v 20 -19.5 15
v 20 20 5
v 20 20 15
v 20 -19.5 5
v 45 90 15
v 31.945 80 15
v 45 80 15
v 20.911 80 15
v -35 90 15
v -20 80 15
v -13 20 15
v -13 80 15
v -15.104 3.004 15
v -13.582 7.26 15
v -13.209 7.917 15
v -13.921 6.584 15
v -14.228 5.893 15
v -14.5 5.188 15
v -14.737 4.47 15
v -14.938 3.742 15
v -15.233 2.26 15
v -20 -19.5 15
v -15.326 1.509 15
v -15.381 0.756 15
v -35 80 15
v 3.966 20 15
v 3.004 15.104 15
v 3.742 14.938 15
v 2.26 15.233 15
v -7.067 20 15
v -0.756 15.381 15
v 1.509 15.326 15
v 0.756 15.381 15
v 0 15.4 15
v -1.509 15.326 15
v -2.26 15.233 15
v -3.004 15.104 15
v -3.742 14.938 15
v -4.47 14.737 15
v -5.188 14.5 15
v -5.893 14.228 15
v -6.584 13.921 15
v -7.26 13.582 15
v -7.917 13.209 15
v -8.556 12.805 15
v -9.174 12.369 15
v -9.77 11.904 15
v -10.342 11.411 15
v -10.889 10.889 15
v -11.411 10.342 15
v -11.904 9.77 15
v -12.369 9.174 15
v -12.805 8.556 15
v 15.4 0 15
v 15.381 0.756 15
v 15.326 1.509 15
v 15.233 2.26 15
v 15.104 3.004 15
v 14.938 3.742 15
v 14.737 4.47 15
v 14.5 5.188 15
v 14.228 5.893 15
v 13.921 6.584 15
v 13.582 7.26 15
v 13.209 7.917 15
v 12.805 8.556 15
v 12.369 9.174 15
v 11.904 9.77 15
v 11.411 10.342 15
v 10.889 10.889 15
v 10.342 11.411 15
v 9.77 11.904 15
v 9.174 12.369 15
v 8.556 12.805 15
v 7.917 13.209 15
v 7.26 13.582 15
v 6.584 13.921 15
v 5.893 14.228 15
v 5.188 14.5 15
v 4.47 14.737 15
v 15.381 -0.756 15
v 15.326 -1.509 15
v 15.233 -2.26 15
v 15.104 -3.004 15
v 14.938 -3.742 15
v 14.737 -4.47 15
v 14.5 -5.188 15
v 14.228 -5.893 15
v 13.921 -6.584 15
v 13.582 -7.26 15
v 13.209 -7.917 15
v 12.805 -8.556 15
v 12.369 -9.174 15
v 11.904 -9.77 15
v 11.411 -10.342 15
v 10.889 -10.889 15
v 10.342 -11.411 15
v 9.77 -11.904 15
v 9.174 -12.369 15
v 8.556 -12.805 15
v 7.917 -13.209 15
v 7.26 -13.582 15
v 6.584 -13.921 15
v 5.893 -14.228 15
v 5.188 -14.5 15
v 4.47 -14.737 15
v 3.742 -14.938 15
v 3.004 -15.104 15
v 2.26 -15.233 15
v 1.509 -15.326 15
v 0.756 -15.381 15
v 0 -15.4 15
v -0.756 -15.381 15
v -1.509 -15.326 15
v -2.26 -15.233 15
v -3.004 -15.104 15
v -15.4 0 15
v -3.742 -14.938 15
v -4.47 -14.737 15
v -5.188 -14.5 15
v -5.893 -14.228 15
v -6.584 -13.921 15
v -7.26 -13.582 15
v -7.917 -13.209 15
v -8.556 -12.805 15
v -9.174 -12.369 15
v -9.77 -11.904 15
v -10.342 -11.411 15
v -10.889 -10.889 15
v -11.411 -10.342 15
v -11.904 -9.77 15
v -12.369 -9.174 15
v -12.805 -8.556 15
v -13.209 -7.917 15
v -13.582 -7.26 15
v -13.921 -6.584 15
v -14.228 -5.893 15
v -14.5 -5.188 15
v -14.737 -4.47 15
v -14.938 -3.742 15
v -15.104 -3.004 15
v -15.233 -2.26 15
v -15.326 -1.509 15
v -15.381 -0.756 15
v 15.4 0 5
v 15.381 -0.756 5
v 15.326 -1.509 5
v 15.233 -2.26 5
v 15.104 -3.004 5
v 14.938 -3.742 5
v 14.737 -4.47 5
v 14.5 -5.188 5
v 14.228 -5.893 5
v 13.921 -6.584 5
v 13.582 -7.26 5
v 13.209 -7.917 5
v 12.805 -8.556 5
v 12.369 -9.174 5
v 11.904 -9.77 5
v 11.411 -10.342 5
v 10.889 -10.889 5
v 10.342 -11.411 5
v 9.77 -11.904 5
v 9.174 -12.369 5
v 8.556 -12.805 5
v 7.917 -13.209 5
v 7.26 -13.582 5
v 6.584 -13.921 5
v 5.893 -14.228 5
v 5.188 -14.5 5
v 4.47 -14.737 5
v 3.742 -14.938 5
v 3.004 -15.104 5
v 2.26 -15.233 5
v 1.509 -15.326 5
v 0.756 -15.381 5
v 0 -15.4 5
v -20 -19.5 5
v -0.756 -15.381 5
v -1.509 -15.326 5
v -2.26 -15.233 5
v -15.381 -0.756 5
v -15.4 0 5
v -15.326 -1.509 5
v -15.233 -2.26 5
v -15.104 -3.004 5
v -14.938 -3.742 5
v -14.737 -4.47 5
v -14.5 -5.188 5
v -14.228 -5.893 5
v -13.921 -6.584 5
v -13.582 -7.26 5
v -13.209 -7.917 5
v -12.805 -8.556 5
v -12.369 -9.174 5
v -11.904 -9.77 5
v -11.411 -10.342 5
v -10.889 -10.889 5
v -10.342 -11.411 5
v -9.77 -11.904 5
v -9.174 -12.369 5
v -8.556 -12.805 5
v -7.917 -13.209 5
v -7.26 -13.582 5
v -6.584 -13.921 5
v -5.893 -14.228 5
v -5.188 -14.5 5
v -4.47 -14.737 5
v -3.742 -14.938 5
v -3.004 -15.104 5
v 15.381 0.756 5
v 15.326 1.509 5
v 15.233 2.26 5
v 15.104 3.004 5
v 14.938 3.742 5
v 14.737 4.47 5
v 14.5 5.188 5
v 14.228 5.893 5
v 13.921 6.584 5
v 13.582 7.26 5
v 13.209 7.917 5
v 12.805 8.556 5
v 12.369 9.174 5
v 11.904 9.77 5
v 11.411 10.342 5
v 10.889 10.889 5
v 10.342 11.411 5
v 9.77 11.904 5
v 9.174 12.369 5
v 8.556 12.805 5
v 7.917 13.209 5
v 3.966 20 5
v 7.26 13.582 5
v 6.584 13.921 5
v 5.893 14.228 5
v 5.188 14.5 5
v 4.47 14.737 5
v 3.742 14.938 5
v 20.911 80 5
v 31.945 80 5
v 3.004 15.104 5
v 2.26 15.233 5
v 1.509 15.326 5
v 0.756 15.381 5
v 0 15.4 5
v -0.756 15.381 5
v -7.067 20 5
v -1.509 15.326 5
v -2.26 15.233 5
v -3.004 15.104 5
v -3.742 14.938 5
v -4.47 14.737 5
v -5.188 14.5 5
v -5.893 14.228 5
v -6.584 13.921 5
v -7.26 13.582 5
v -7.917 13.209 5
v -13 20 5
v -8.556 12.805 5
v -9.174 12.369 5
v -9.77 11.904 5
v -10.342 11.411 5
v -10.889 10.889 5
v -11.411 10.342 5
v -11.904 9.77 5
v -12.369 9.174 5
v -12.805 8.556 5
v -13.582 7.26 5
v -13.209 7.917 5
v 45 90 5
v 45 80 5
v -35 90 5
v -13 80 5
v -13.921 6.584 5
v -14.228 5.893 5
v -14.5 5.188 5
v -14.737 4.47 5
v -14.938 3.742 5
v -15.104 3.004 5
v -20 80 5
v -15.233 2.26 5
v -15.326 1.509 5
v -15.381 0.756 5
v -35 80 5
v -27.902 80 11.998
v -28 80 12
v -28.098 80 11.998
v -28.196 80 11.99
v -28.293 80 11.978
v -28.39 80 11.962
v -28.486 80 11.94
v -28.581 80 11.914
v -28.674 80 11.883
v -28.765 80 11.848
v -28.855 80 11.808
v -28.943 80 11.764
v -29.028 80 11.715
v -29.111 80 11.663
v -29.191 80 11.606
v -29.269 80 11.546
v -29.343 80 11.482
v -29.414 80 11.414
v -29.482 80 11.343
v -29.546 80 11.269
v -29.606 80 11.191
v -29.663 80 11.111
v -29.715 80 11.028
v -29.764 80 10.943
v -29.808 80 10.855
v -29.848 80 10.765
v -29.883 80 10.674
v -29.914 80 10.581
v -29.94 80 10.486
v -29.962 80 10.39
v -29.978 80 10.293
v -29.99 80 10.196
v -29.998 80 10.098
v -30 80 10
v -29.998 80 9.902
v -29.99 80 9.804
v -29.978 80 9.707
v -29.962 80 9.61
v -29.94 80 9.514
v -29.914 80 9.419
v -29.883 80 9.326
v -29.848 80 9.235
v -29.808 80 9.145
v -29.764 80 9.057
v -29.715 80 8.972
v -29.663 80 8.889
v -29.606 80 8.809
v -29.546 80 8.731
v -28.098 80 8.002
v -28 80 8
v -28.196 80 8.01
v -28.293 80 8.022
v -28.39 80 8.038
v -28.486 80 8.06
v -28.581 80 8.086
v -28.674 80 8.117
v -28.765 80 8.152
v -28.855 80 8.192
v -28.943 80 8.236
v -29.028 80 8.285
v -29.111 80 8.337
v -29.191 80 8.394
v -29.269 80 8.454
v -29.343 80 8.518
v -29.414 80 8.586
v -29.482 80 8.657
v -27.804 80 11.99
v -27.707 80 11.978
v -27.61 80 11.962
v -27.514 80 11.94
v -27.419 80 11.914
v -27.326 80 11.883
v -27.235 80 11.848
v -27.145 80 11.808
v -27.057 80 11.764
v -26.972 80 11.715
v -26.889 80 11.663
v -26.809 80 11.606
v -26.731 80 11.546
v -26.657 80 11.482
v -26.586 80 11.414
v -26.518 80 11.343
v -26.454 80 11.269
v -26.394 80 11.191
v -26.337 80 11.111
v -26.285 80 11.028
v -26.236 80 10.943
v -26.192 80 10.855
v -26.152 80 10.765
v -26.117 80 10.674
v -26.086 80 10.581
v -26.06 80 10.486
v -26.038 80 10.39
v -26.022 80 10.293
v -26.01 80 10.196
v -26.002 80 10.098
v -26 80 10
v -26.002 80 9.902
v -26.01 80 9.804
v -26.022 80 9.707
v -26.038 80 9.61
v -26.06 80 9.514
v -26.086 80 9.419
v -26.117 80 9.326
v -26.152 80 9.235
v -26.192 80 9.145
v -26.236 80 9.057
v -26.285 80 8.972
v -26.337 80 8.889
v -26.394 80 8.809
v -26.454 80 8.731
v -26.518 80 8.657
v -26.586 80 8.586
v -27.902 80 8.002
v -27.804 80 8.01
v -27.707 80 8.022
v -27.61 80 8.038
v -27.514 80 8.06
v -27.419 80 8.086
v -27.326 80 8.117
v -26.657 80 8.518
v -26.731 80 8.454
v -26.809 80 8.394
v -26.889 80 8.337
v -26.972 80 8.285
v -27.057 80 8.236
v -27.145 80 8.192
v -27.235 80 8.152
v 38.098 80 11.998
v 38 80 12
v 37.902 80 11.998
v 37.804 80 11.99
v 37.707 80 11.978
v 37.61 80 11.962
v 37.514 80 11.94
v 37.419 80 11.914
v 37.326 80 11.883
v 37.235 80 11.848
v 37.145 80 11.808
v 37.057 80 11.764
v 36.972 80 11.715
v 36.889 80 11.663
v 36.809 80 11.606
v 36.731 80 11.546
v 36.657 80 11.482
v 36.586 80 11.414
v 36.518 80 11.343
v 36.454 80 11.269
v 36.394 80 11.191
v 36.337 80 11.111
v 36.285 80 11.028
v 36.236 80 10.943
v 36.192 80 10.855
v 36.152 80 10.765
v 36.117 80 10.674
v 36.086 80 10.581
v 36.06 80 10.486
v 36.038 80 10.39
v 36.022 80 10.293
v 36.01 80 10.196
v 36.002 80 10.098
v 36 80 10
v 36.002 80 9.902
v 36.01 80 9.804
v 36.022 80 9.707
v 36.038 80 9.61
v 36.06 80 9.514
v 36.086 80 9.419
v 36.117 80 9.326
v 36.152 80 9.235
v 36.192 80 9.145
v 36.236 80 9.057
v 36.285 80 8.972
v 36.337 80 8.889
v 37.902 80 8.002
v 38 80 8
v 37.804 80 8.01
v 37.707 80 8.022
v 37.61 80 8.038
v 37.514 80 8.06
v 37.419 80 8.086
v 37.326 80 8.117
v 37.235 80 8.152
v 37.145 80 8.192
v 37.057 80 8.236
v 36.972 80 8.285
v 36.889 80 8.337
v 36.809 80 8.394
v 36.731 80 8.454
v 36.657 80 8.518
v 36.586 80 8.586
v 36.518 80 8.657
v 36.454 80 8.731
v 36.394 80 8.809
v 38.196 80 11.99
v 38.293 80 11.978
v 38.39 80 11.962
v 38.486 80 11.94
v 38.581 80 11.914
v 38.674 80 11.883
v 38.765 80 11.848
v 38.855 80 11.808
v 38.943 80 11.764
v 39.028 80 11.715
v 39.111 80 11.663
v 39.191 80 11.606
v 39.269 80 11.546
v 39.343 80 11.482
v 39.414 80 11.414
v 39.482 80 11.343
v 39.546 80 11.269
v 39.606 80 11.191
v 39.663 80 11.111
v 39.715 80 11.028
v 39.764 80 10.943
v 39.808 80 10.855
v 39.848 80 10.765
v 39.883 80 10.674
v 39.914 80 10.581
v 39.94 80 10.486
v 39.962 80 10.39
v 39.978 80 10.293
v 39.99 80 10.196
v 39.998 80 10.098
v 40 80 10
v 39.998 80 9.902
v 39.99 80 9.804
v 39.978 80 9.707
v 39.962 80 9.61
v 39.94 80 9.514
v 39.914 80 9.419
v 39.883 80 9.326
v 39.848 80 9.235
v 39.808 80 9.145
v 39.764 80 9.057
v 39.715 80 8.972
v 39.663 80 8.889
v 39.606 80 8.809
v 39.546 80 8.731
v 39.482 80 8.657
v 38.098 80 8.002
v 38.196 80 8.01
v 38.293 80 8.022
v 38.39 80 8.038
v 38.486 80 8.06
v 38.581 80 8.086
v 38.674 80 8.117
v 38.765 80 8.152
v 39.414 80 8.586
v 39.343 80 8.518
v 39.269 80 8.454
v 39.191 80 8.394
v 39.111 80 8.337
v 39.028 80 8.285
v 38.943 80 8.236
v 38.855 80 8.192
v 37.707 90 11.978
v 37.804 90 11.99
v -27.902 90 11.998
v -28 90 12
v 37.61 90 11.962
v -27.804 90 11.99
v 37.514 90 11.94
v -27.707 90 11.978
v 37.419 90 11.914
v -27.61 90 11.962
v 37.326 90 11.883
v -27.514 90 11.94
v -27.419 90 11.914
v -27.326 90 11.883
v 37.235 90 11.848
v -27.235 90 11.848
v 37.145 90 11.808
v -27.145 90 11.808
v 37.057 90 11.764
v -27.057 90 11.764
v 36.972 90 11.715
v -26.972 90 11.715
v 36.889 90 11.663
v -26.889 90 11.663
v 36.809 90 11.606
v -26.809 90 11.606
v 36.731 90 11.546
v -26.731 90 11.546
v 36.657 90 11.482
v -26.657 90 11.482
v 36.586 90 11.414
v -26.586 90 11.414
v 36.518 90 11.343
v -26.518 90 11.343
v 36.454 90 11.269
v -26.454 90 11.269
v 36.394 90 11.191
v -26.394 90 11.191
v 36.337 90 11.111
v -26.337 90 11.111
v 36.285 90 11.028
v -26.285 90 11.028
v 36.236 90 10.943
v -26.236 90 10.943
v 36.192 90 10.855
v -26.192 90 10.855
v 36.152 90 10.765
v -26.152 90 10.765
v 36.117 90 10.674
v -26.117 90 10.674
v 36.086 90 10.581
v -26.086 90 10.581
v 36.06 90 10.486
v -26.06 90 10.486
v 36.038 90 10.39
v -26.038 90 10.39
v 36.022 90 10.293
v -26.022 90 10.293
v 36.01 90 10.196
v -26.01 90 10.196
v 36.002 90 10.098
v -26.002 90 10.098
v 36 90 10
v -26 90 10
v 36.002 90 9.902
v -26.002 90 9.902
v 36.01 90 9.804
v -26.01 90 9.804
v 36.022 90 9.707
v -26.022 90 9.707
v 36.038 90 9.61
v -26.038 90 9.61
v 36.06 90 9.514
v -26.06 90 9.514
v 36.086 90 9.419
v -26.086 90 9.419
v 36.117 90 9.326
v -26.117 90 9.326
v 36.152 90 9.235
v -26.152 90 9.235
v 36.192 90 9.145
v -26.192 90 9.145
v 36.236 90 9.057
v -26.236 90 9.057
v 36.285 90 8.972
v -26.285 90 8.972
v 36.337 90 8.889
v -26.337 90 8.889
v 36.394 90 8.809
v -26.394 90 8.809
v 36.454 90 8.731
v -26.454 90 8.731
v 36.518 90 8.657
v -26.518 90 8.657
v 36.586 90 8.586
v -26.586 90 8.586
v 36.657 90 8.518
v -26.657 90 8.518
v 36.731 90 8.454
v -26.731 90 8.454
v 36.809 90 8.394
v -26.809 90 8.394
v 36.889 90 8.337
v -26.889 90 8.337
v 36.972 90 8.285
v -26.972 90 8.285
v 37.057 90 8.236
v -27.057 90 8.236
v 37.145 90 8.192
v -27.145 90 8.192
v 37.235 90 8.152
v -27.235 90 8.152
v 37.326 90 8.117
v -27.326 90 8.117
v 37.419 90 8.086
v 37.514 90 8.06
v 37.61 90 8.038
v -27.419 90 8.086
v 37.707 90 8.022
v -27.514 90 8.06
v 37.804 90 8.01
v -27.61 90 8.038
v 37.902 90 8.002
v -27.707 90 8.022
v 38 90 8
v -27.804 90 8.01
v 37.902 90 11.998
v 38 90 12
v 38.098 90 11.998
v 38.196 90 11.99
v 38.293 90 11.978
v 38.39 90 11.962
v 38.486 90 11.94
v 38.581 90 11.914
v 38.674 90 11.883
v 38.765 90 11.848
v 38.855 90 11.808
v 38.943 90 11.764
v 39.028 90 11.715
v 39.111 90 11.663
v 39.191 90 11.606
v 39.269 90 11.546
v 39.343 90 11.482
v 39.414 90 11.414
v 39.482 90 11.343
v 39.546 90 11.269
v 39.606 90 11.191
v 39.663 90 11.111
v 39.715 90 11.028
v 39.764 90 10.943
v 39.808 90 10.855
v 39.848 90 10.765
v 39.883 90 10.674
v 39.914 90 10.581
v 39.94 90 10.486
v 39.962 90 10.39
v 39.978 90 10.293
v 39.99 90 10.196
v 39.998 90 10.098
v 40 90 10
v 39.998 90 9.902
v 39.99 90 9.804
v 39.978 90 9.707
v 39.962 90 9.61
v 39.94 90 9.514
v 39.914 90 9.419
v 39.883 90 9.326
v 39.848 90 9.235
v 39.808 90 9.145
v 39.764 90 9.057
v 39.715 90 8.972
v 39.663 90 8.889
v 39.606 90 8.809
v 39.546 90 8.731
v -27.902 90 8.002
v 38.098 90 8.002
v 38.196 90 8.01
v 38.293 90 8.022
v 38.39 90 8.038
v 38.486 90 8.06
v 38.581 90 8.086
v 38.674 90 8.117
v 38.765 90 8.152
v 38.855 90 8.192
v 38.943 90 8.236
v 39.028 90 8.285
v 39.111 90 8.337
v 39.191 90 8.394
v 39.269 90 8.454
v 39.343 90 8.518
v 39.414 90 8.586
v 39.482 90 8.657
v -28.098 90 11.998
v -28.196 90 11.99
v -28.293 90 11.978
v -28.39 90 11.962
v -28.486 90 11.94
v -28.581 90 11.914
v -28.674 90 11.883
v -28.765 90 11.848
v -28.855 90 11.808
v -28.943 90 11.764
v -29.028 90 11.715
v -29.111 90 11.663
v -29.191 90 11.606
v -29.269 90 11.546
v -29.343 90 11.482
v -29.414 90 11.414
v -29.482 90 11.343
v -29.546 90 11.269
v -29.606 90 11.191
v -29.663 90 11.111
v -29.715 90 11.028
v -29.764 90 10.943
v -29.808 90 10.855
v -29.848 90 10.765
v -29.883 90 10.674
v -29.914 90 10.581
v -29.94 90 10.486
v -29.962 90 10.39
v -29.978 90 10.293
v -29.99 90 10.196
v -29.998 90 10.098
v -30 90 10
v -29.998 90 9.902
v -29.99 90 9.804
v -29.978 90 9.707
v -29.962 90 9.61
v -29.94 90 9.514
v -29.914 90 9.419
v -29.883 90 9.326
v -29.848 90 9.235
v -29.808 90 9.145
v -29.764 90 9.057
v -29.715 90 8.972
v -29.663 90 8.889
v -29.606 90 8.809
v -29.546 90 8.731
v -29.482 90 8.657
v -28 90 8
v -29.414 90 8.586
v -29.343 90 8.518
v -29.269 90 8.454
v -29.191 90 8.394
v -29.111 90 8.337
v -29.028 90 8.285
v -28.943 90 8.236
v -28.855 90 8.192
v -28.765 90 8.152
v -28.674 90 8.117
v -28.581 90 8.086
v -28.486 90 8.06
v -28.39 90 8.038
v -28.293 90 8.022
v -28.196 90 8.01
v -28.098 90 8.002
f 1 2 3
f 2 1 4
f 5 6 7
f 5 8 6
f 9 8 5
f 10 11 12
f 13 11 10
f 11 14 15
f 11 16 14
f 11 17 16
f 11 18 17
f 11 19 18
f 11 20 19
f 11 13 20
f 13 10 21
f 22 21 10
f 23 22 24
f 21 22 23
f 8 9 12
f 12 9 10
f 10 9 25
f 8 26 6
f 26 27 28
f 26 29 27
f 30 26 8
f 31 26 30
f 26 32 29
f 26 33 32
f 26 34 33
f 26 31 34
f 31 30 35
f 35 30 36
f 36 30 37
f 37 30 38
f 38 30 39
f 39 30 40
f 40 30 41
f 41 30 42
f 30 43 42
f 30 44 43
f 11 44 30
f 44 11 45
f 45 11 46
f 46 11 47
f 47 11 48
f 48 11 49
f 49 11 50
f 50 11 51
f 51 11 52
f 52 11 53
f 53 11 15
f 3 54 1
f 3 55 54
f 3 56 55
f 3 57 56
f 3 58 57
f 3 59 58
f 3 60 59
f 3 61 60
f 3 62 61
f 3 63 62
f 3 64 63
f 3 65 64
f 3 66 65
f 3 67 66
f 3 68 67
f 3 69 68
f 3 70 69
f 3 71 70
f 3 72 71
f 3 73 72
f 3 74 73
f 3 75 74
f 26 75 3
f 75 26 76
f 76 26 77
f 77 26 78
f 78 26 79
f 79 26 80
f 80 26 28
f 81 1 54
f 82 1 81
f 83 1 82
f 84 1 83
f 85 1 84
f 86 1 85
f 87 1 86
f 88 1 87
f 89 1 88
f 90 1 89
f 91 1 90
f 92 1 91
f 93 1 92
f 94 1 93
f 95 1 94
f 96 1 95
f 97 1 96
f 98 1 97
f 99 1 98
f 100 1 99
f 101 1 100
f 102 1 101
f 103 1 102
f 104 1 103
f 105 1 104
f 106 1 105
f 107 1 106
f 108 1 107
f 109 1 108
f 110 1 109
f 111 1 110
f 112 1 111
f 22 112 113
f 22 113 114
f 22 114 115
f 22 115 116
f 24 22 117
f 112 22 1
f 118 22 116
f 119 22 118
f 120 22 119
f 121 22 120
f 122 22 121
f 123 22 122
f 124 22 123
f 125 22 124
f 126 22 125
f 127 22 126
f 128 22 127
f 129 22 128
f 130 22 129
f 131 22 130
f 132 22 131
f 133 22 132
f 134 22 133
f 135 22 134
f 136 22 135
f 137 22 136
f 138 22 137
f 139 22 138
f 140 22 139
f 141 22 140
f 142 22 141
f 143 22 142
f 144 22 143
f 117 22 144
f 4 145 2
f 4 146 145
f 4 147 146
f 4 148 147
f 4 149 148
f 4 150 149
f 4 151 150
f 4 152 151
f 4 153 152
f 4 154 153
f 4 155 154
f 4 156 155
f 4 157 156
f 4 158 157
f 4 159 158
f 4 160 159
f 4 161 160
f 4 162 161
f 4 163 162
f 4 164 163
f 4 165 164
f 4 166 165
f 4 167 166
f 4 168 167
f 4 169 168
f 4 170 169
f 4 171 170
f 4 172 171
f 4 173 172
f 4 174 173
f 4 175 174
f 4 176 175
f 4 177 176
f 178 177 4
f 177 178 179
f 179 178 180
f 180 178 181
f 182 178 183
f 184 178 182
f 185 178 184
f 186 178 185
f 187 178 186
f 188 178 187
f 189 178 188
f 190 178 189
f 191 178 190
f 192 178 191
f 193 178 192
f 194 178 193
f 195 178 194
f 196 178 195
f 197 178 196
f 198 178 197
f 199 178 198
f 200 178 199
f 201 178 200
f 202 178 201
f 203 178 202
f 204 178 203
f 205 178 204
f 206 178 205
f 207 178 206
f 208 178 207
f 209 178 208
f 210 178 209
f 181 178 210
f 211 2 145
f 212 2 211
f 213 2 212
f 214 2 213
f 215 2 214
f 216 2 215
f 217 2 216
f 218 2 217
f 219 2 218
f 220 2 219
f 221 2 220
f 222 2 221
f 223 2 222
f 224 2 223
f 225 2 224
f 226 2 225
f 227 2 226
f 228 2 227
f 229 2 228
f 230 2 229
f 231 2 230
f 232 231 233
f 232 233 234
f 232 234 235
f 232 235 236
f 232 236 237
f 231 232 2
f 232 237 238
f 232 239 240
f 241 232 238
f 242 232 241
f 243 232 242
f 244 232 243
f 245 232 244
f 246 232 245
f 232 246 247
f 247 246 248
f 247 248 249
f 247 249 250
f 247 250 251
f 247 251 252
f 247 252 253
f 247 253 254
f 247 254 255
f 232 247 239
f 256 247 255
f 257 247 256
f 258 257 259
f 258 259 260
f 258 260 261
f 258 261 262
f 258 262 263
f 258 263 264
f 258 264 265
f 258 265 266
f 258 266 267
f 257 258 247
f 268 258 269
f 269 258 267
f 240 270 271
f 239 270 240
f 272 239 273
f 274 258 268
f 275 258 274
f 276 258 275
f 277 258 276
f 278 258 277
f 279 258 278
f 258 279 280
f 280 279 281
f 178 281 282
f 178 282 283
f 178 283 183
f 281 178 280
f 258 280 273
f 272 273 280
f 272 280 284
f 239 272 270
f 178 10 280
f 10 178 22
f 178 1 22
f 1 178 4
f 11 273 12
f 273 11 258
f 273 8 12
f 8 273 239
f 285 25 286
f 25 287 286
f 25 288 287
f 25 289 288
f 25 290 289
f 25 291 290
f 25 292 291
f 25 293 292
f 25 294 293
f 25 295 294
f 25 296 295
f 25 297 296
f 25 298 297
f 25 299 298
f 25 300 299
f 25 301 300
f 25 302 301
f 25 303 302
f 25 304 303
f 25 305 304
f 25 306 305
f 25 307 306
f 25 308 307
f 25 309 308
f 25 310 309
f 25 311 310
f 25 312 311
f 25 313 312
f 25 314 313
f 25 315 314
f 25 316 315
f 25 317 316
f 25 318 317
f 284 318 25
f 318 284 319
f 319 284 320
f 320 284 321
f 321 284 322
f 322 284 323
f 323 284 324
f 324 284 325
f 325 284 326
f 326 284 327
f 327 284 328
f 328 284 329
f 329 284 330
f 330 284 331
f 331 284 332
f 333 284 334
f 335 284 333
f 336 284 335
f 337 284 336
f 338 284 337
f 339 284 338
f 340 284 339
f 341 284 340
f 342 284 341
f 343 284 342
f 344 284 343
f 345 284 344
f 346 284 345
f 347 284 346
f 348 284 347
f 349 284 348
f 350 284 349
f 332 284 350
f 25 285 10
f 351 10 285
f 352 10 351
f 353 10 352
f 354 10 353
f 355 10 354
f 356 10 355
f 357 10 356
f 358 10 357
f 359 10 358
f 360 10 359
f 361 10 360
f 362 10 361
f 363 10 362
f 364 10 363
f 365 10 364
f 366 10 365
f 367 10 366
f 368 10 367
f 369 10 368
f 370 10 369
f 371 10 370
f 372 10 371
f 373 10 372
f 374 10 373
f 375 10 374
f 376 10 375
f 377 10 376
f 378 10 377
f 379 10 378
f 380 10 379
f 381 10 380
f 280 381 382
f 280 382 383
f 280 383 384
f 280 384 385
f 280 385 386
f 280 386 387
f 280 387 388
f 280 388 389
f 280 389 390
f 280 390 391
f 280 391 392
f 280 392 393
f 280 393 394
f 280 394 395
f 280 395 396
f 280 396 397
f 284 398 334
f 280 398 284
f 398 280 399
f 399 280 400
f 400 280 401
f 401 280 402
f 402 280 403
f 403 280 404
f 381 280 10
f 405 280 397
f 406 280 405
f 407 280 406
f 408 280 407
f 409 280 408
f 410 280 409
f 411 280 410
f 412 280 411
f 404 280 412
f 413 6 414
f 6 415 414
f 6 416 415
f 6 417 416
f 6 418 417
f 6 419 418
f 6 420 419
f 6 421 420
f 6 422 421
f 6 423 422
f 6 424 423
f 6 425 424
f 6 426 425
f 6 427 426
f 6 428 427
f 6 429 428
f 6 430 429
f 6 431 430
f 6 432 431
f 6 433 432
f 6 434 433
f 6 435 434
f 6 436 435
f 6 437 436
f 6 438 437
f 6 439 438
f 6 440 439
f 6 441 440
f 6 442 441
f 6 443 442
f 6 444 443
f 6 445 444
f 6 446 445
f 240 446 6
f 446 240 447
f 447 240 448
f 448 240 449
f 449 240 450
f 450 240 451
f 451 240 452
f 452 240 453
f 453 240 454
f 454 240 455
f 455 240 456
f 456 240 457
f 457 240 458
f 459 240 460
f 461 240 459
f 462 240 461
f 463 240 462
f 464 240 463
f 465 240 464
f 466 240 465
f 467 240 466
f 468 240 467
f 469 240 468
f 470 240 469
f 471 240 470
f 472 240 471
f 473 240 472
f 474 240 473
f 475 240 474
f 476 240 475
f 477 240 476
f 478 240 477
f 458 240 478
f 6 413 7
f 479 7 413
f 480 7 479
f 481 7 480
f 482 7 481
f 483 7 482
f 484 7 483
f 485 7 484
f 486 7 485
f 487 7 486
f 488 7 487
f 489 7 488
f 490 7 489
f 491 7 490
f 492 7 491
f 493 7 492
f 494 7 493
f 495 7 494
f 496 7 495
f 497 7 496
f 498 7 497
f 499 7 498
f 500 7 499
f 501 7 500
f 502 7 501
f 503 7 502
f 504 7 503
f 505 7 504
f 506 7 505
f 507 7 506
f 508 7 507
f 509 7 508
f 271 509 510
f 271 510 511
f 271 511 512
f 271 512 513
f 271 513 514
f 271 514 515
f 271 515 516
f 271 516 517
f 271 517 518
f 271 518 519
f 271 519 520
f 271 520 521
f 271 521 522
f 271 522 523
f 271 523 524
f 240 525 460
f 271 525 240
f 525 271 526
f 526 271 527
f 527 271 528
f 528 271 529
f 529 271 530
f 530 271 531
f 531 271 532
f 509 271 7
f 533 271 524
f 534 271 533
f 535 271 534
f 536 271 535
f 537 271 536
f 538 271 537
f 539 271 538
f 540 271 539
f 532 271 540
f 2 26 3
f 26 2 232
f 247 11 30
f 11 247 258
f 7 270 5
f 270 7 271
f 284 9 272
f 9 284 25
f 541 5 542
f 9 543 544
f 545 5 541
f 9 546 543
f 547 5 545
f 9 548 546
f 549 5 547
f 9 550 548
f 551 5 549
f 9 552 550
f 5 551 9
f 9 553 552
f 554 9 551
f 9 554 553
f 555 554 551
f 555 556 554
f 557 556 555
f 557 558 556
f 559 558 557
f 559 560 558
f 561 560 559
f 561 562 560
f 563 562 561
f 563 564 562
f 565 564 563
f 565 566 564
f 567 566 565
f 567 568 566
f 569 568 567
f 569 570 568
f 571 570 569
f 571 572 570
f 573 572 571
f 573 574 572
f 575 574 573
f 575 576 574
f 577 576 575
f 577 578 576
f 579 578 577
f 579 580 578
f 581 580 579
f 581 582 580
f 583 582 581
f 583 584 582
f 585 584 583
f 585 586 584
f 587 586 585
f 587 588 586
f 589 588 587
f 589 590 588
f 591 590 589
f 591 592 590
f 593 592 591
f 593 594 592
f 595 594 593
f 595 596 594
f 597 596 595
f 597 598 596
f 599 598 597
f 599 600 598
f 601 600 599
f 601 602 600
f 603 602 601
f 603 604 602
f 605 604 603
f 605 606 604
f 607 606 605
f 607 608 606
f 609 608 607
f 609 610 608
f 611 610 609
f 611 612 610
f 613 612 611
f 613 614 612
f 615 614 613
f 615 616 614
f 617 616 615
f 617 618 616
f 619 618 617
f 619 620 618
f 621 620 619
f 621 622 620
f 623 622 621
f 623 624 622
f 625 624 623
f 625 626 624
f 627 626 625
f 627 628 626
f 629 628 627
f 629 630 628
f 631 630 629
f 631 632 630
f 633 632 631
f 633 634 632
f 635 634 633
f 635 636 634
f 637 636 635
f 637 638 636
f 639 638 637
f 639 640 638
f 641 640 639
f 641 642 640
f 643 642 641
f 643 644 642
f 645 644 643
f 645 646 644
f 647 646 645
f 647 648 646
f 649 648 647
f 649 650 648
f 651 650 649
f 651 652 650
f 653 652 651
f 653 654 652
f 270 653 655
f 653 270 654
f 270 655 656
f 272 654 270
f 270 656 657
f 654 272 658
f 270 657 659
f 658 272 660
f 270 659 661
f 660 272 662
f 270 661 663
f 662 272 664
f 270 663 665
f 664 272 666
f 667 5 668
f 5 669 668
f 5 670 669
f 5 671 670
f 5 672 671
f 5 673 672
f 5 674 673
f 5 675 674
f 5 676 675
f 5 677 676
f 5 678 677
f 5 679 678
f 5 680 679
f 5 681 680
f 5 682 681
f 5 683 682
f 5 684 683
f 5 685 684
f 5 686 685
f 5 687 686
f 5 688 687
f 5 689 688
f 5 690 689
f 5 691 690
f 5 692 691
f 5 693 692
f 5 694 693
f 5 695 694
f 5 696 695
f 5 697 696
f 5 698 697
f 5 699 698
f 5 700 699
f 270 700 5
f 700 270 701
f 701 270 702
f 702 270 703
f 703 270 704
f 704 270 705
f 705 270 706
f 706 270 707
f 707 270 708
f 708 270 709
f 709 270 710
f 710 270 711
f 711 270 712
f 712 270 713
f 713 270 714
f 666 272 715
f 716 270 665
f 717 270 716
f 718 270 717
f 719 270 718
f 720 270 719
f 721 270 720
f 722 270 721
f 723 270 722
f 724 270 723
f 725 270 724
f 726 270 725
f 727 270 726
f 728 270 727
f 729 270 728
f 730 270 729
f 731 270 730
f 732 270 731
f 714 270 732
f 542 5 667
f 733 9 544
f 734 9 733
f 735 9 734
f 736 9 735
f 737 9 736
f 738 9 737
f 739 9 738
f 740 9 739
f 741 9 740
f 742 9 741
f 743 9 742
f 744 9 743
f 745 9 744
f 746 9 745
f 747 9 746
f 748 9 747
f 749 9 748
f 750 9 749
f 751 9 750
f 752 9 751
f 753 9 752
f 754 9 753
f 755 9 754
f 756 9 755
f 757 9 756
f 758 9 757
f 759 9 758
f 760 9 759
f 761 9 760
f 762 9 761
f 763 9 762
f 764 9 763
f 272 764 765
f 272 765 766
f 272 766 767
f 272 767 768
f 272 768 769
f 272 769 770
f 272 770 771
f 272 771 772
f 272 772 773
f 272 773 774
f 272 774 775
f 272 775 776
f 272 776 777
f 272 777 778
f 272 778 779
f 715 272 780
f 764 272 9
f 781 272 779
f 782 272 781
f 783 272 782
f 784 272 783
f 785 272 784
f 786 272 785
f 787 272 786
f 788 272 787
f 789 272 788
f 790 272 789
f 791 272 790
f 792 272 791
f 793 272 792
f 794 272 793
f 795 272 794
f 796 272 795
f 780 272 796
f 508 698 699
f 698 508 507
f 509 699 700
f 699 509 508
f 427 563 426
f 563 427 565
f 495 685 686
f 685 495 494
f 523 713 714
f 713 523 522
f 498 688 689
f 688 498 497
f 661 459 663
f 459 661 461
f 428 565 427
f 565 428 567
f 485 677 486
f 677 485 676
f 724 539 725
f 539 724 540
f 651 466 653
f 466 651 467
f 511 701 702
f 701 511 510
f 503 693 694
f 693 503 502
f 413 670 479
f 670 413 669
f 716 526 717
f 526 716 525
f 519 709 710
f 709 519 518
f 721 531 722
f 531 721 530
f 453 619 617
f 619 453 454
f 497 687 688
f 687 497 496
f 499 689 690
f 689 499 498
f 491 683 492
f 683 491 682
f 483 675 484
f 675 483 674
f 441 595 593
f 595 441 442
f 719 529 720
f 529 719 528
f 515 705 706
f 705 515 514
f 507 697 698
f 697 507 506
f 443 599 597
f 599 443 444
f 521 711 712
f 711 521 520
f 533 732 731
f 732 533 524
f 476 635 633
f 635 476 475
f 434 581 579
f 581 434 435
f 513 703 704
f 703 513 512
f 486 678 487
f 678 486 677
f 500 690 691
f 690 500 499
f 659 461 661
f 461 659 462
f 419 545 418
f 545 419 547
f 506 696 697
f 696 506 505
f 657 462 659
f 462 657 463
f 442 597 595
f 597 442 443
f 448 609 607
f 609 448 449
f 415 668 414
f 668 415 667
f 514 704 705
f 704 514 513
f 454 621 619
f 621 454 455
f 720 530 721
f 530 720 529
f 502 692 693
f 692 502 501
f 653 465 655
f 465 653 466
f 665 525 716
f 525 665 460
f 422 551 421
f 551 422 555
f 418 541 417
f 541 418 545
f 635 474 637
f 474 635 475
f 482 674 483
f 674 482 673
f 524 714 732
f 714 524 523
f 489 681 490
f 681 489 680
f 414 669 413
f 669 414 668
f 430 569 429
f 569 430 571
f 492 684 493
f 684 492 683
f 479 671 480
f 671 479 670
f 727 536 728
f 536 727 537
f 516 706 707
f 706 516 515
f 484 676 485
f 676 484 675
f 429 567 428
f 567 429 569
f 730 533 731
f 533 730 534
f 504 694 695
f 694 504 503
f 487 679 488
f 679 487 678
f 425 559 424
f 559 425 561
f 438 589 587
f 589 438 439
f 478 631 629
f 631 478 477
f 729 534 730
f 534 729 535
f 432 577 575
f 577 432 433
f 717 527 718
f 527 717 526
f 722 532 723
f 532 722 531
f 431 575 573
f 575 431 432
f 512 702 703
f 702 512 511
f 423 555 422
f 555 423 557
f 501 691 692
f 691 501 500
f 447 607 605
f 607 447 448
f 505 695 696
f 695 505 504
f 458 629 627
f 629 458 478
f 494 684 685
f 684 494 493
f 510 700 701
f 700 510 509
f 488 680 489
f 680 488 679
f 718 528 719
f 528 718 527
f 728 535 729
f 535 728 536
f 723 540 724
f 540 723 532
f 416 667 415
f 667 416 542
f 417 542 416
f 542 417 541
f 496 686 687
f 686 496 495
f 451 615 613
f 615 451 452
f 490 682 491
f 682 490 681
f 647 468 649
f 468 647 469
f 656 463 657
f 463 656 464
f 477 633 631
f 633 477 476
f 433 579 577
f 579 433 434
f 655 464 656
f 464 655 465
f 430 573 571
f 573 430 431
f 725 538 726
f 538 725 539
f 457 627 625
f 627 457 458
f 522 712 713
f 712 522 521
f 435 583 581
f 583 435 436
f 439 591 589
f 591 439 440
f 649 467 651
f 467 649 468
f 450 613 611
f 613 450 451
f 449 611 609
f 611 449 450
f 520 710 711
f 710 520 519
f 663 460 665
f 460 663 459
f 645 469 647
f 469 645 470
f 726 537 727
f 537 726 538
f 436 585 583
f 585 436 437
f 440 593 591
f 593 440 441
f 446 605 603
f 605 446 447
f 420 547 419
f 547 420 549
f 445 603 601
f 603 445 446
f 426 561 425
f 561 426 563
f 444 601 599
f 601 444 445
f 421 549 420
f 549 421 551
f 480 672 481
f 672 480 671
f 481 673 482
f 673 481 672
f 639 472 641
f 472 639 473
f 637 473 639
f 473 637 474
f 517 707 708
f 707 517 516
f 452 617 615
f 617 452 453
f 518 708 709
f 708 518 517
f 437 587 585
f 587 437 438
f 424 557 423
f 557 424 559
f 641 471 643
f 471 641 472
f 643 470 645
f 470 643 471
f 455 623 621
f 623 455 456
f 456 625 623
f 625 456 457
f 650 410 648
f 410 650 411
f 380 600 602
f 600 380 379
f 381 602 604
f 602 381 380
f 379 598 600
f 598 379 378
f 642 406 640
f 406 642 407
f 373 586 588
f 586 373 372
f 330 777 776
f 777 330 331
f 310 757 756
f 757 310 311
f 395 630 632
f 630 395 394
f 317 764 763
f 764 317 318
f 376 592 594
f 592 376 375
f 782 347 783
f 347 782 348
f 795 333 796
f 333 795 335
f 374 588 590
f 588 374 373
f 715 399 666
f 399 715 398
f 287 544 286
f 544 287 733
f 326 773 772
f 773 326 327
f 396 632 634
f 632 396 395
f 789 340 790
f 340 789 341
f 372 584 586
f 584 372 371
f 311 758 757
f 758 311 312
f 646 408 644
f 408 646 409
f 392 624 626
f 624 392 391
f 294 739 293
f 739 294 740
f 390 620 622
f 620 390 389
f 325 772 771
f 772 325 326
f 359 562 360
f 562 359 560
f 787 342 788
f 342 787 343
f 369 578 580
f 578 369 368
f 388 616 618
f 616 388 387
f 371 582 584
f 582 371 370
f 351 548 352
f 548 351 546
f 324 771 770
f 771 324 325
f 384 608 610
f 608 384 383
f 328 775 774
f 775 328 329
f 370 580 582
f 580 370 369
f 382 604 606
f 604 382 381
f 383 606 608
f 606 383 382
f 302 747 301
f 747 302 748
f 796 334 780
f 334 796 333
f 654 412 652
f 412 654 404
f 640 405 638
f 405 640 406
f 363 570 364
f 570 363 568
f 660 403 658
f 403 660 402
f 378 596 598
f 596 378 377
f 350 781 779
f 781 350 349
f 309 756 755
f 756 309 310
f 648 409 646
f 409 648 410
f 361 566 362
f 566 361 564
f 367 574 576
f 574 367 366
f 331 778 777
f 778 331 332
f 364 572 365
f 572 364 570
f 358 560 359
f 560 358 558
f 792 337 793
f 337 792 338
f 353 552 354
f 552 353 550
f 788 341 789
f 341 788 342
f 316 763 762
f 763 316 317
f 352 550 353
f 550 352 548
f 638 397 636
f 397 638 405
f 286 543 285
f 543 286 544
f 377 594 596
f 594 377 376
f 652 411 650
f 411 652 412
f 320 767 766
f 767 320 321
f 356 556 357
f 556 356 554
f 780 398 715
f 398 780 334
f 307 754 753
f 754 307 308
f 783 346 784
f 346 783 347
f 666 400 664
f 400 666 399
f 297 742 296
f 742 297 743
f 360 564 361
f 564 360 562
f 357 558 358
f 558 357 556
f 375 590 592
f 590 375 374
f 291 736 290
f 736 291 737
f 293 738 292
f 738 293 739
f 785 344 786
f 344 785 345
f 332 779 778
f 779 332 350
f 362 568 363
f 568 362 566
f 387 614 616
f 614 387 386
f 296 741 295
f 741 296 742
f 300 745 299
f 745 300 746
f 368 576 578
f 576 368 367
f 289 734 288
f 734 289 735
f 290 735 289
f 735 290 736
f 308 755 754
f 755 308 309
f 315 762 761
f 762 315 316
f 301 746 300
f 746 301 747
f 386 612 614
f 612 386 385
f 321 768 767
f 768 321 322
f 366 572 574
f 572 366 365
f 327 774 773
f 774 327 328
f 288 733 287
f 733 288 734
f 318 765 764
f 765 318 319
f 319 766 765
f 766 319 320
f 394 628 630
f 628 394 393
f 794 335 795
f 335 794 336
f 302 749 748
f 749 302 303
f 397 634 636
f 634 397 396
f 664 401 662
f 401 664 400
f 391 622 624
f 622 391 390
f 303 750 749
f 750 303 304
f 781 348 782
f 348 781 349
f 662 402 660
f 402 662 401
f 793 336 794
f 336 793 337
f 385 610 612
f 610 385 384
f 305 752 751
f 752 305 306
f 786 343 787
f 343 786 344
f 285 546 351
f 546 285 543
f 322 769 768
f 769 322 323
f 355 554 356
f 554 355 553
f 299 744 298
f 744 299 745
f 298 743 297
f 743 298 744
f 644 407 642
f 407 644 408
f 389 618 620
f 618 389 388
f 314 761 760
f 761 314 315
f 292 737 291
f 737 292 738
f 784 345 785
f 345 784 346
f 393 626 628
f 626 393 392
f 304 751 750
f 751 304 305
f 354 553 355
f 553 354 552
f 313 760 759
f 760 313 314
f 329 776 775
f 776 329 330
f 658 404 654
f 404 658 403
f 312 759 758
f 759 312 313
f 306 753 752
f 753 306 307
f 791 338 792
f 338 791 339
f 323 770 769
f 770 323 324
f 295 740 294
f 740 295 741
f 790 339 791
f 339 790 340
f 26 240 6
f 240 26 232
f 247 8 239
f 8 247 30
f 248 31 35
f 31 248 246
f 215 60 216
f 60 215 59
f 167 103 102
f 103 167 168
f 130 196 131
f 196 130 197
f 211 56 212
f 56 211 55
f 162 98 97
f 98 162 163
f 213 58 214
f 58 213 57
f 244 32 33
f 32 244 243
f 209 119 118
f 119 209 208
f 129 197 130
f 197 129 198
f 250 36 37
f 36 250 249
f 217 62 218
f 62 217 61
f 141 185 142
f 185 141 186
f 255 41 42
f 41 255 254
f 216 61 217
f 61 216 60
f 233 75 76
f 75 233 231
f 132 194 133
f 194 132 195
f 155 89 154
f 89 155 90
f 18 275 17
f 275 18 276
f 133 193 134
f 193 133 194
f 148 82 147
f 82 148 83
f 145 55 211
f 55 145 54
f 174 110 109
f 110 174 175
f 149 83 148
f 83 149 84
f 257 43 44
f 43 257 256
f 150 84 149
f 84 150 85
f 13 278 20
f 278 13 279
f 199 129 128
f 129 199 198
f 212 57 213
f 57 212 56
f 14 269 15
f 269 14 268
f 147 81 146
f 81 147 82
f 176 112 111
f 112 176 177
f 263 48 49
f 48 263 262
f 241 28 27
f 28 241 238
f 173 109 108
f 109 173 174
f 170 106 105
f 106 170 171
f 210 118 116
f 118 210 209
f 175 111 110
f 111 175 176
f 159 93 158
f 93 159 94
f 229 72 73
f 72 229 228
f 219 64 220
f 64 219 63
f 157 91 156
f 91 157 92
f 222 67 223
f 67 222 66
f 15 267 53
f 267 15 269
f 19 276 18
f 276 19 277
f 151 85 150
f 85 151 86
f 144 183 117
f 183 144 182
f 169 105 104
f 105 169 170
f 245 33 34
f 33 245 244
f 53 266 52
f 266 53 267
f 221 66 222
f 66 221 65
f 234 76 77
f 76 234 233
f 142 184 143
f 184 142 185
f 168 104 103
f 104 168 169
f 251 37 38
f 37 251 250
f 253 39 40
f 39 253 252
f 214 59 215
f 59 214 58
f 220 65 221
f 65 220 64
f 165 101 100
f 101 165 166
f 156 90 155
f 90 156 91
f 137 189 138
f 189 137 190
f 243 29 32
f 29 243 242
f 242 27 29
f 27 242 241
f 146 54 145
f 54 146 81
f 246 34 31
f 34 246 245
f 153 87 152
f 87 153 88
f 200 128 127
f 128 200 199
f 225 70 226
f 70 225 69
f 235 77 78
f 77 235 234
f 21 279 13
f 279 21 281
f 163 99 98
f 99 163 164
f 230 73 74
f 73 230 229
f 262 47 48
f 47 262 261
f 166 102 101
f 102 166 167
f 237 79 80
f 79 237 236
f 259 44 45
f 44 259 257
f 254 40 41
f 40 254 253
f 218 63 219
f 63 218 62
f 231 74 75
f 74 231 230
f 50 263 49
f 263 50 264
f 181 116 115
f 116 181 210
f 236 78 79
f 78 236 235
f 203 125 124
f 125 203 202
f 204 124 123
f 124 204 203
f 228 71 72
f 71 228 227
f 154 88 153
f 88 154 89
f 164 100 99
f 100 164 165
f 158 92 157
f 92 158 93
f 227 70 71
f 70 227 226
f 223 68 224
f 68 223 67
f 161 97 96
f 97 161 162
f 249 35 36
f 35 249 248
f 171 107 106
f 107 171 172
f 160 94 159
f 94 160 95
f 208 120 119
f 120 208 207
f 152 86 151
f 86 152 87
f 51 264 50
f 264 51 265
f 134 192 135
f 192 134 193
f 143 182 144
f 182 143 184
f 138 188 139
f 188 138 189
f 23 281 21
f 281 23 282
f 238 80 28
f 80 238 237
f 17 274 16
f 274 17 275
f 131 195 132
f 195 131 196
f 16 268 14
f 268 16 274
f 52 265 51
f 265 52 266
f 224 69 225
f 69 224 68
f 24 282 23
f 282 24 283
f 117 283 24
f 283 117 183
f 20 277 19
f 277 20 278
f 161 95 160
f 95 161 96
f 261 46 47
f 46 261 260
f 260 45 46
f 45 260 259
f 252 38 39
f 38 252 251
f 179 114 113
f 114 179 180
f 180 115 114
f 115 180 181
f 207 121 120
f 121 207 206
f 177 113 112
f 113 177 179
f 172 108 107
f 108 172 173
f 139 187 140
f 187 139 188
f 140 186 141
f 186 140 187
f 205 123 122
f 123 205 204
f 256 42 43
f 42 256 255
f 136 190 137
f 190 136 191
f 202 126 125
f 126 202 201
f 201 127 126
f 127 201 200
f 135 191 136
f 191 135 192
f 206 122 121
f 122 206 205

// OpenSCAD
$fn=128;

depth = 10;

module servo(){
    translate([-10,-10,0]){
        cube([40.5, 20, 38]);
        // flaps
        translate([-7, 0,27])
        cube([40.5+2*7,20,2.5]);
        // servo-horn 27.6 from far side
        translate([40.5-27.6-3,10,38])
        cylinder(r=3, h=6);
        
        // cables
        translate([-10,(20-8)/2,3])
        cube([10,8,4]);
    }
}

module mount(){
    // bar should be 9 cm from wall
    // wall
    //translate([-250,90, -250]) %cube([500, 10, 5000]);

    // model bar
    // translate([0,0,45])    cylinder(r=28/2, h=500);

    // housing/mount
    difference(){
        translate([10,37,20])
        cube([55, 75+30,20], center=true);
        
        translate([-8,20,5])
        cube([75, 60, 30]);

        scale([1.05, 1.05, 1.05])
        servo();
        
        translate([-20,-5,9])
        cube([10,10,12]);
        
        translate([30,-5,9])
        cube([10,10,12]);
    }
    translate([-8,18,10])
        rotate([0,0,-25])
        cube([10, 75, 20]);

    difference(){
        translate([5,90-5,20])
        cube([80, 10, 20], center=true);
        
        translate([38,95,20])
        rotate([90,0,0])
        cylinder(r=2, h=40);
        
        translate([-28,95,20])
        rotate([90,0,0])
        cylinder(r=2, h=40);
    }
}

module mount_passive(){
    // bar should be 9 cm from wall
    // wall
    //translate([-250,90, -250]) %cube([500, 10, 5000]);

    // model bar
    // translate([0,0,45])    cylinder(r=28/2, h=500);
    difference(){
        union(){
            // housing/mount
            difference(){
                translate([0,33,depth])
                cube([40, 75+30,depth], center=true);
                
                translate([-13,20,0])
                cube([75, 60, depth+10]);
            }
            translate([-8,18,depth/2])
            rotate([0,0,-25])
            cube([10, 75, depth]);

            difference(){
                translate([5,90-5,depth])
                cube([80, 10, depth], center=true);
                
                translate([38,95,depth])
                rotate([90,0,0])
                cylinder(r=2, h=40);
                
                translate([-28,95,depth])
                rotate([90,0,0])
                cylinder(r=2, h=40);
            }
        }
        scale([1.1,1.1,1.1])
       translate([0,0,0]) cylinder(r=28/2, h=40);
    }
    
}

module adapter(){
    // to attach a servo-wheel-horn to the bar itself
    // bar is 28mm in diameter
    // servo-wheel is 21.5mm in diameter
    difference(){
        cylinder(r=28/2+1, h=10);
        translate([0,0,1])
        cylinder(r=28/2, h=10);
    }
    
    translate([0,0,-2])
    difference(){
        cylinder(r=21.5/2+1, h=2);
        translate([0,0,-1])
        cylinder(r=21.5/2, h=2);
    }
}

//mount();
//translate([0,0,500])
mount_passive();

//#servo();

//adapter();
/*

# translate([0,0,50]) cylinder(r=28/2, h=450);
*/
